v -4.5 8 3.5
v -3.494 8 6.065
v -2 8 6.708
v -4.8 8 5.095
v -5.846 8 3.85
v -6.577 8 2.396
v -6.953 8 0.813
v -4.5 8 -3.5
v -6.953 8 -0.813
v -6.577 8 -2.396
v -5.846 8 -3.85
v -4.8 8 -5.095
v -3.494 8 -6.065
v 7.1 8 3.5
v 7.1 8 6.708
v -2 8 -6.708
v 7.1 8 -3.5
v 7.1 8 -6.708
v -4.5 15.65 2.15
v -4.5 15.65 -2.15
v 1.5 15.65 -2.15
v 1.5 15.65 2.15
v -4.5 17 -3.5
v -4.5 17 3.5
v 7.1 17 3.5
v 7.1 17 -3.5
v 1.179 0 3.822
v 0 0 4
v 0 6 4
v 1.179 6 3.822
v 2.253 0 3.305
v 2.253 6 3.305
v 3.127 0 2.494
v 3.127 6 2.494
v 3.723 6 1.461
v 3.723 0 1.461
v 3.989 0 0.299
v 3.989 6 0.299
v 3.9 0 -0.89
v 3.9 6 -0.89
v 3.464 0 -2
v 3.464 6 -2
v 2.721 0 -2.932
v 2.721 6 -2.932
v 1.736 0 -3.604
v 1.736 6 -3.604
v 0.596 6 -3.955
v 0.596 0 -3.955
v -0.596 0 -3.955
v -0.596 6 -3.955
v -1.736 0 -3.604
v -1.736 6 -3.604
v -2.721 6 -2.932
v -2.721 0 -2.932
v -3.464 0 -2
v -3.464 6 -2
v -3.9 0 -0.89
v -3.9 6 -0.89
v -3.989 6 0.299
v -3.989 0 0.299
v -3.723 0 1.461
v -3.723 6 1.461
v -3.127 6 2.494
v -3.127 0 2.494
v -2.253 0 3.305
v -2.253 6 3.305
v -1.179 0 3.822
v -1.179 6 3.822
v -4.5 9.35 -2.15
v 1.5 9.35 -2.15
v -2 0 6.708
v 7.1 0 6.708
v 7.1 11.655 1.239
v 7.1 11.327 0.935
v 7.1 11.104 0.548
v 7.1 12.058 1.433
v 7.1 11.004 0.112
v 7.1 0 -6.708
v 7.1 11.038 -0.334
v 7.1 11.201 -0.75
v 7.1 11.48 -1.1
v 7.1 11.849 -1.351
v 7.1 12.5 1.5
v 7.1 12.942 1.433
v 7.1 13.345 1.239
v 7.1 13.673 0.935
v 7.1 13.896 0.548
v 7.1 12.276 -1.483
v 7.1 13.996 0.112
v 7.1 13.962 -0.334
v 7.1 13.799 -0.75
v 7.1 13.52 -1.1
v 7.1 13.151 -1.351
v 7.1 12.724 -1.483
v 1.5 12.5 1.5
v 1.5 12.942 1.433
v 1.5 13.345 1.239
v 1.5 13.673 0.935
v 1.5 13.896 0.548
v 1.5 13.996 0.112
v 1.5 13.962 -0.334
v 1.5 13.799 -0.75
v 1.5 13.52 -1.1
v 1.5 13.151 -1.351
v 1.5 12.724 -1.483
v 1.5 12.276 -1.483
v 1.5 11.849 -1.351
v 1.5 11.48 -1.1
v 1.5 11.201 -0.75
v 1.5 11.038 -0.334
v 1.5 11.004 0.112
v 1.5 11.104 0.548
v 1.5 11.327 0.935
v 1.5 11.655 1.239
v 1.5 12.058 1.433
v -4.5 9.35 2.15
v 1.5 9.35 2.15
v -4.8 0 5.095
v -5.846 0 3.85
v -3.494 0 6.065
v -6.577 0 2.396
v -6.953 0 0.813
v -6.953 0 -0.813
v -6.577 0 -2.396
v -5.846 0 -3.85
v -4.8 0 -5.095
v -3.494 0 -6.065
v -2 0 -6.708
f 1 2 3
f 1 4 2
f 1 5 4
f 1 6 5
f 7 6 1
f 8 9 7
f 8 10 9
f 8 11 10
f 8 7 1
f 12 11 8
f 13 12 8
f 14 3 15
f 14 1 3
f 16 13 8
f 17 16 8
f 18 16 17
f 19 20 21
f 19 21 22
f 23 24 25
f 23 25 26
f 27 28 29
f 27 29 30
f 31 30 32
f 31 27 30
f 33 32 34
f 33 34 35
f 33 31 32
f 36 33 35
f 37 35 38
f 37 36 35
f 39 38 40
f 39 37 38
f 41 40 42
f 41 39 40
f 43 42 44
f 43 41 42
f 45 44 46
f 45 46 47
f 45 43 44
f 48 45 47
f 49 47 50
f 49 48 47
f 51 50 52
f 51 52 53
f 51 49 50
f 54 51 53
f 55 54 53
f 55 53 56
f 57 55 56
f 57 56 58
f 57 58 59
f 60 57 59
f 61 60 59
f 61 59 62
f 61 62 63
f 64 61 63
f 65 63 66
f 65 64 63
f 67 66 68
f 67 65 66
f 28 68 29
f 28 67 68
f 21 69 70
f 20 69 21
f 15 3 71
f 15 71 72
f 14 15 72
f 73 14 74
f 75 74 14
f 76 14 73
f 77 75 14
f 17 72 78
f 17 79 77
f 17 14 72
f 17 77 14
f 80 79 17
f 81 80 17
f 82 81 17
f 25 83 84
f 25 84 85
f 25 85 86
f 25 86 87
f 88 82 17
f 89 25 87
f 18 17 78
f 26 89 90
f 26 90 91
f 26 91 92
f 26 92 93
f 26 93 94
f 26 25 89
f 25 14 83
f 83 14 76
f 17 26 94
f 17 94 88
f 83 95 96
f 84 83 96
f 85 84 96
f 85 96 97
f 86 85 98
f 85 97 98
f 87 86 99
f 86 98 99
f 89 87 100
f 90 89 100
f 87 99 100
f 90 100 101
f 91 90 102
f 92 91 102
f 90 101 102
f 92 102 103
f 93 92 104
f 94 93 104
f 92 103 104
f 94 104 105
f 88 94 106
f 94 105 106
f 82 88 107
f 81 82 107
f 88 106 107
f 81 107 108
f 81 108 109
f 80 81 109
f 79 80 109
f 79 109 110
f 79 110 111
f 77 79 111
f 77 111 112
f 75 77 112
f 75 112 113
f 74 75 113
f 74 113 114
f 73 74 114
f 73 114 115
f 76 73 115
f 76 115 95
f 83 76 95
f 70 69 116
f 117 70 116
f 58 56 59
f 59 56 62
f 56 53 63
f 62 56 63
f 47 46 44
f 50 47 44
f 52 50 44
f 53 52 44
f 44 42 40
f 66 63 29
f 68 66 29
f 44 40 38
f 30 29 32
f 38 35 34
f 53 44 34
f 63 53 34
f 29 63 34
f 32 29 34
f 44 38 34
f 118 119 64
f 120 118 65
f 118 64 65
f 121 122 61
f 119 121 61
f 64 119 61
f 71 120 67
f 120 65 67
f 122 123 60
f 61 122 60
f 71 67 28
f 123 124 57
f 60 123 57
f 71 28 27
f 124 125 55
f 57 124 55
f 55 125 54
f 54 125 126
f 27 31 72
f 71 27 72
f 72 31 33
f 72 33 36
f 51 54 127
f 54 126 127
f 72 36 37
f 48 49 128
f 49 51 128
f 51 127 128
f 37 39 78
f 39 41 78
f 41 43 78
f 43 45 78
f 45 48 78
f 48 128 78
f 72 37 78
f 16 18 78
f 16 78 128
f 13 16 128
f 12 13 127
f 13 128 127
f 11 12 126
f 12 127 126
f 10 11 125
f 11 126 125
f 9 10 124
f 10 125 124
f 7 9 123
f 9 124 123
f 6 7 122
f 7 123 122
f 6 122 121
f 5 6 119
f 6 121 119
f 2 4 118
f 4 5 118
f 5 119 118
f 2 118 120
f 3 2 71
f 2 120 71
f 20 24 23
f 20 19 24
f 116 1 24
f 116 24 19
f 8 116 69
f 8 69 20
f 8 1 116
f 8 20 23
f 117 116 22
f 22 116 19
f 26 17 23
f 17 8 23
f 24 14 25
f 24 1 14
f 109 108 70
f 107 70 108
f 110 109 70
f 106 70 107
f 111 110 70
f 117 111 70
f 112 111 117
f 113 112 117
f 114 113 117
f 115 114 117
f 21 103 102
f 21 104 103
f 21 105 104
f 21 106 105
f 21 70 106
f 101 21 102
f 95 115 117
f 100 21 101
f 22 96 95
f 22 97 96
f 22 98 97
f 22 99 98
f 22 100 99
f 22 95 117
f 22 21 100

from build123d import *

# Parameters (mm, degrees)
SKETCH1_R           = 7
SKETCH1_R_2         = 4
BOSS_EXTRUDE1_DEPTH = 6
SKETCH2_R           = 7
BOSS_EXTRUDE2_DEPTH = 10
CUT_EXTRUDE1_DEPTH  = 8
SKETCH4_W           = 4.3
SKETCH4_H           = 6.3
CUT_EXTRUDE2_DEPTH  = 6
SKETCH5_OUTSIDE_W   = 21.092
SKETCH5_OUTSIDE_H   = 21.092
CUT_EXTRUDE3_DEPTH  = 8
BOSS_EXTRUDE3_DEPTH = 8
SKETCH9_R           = 7
CUT_EXTRUDE6_DEPTH  = 8
SKETCH10_W          = 9
SKETCH10_H          = 7
BOSS_EXTRUDE5_DEPTH = 9
SKETCH11_W          = 4.3
SKETCH11_H          = 6.3
CUT_EXTRUDE7_DEPTH  = 6
BOSS_EXTRUDE6_DEPTH = 8
SKETCH14_W          = 7
SKETCH14_H          = 9
BOSS_EXTRUDE7_DEPTH = 2.6
SKETCH15_W          = 4
SKETCH15_H          = 5
CUT_EXTRUDE10_DEPTH = 9
SKETCH16_R          = 1.5
CUT_EXTRUDE11_DEPTH = 6.6


with BuildPart() as part:
    # Sketch1 → Boss-Extrude1 (new body)
    with BuildSketch(Plane(origin=(0, 0, 0), x_dir=(1, 0, 0), z_dir=(0, 1, 0))):
        with Locations(Location((0, 0, 0), (0, 0, 270))):  # turned: the seam where the file's is
            Circle(SKETCH1_R)
        with Locations(Location((0, 0, 0), (0, 0, 270))):  # turned: the seam where the file's is
            Circle(SKETCH1_R_2, mode=Mode.SUBTRACT)
    extrude(amount=BOSS_EXTRUDE1_DEPTH)

    # Sketch2 → Boss-Extrude2 (add)
    with BuildSketch(Plane(origin=(0, 6, 0), x_dir=(1, 0, 0), z_dir=(0, 1, 0))):
        with Locations(Location((0, 0, 0), (0, 0, 270))):  # turned: the seam where the file's is
            Circle(SKETCH2_R)
    extrude(amount=BOSS_EXTRUDE2_DEPTH)

    # Sketch3 → Cut-Extrude1 (cut)
    with BuildSketch(Plane(origin=(0, 16, 0), x_dir=(1, 0, 0), z_dir=(0, 1, 0))):
        with BuildLine():
            Line((0, 7), (0, -7))
            ThreePointArc((0, -7), (-7, 0), (0, 7))
        make_face()
    extrude(amount=-CUT_EXTRUDE1_DEPTH, mode=Mode.SUBTRACT)

    # Sketch4 → Cut-Extrude2 (cut)
    with BuildSketch(Plane.ZY):
        with Locations((0, 12.15)):
            Rectangle(SKETCH4_W, SKETCH4_H)
    extrude(amount=-CUT_EXTRUDE2_DEPTH, mode=Mode.SUBTRACT)

    # Sketch5 outside → Cut-Extrude3 (cut)
    with BuildSketch(Plane(origin=(0, 16, 0), x_dir=(1, 0, 0), z_dir=(0, 1, 0))):
        Rectangle(SKETCH5_OUTSIDE_W, SKETCH5_OUTSIDE_H)
        with BuildLine():
            Line((0, 4), (5.744562647, 4))
            ThreePointArc((5.744562647, 4), (7, 0), (5.744562647, -4))
            Line((5.744562647, -4), (0, -4))
            Line((0, -4), (0, 4))
        make_face(mode=Mode.SUBTRACT)
    extrude(amount=-CUT_EXTRUDE3_DEPTH, mode=Mode.SUBTRACT)

    # Sketch7 → Boss-Extrude3 (add)
    with BuildSketch(Plane(origin=(0, 8, 0), x_dir=(1, 0, 0), z_dir=(0, 1, 0))):
        with BuildLine():
            Line((2, 6.708203932), (2, 11.708203932))
            Line((2, 11.708203932), (-2, 11.708203932))
            Line((-2, 11.708203932), (-2, 6.708203932))
            ThreePointArc((-2, 6.708203932), (0, 7), (2, 6.708203932))
        make_face()
        with BuildLine():
            Line((2, -6.708203932), (2, -11.708203932))
            Line((2, -11.708203932), (-2, -11.708203932))
            Line((-2, -11.708203932), (-2, -6.708203932))
            ThreePointArc((-2, -6.708203932), (0, -7), (2, -6.708203932))
        make_face()
    extrude(amount=-BOSS_EXTRUDE3_DEPTH)

    # Sketch9 → Cut-Extrude6 (cut)
    with BuildSketch(Plane(origin=(0, 16, 0), x_dir=(1, 0, 0), z_dir=(0, 1, 0))):
        Circle(SKETCH9_R)
    extrude(amount=-CUT_EXTRUDE6_DEPTH, mode=Mode.SUBTRACT)

    # Sketch10 → Boss-Extrude5 (add)
    with BuildSketch(Plane(origin=(0, 8, 0), x_dir=(1, 0, 0), z_dir=(0, 1, 0))):
        Rectangle(SKETCH10_W, SKETCH10_H)
    extrude(amount=BOSS_EXTRUDE5_DEPTH)

    # Sketch11 → Cut-Extrude7 (cut)
    with BuildSketch(Plane.ZY.offset(4.5)):
        with Locations((0, 12.5)):
            Rectangle(SKETCH11_W, SKETCH11_H)
    extrude(amount=-CUT_EXTRUDE7_DEPTH, mode=Mode.SUBTRACT)

    # Sketch13 → Boss-Extrude6 (add)
    with BuildSketch(Plane(origin=(0, 8, 0), x_dir=(1, 0, 0), z_dir=(0, 1, 0))):
        with BuildLine():
            Line((2, -6.708203932), (7.1, -6.708203932))
            Line((7.1, -6.708203932), (7.1, 6.708203932))
            Line((7.1, 6.708203932), (2, 6.708203932))
            ThreePointArc((2, 6.708203932), (7, 0), (2, -6.708203932))
        make_face()
    extrude(amount=-BOSS_EXTRUDE6_DEPTH)

    # Sketch14 → Boss-Extrude7 (add)
    with BuildSketch(Plane(origin=(4.5, 0, 0), x_dir=(0, 0, -1), z_dir=(1, 0, 0))):
        with Locations((0, 12.5)):
            Rectangle(SKETCH14_W, SKETCH14_H)
    extrude(amount=BOSS_EXTRUDE7_DEPTH)

    # Sketch15 → Cut-Extrude10 (cut, through all)
    with BuildSketch(Plane(origin=(0, 8, 0), x_dir=(1, 0, 0), z_dir=(0, 1, 0))):
        with Locations((0, 9.208203932)):
            Rectangle(SKETCH15_W, SKETCH15_H)
        with Locations((0, -9.208203932)):
            Rectangle(SKETCH15_W, SKETCH15_H)
    extrude(amount=-CUT_EXTRUDE10_DEPTH, mode=Mode.SUBTRACT)

    # Sketch16 → Cut-Extrude11 (cut, through all)
    with BuildSketch(Plane.ZY.offset(-1.5)):
        with Locations((0, 12.5)):
            Circle(SKETCH16_R)
    extrude(amount=-CUT_EXTRUDE11_DEPTH, mode=Mode.SUBTRACT)


solid = part.part
